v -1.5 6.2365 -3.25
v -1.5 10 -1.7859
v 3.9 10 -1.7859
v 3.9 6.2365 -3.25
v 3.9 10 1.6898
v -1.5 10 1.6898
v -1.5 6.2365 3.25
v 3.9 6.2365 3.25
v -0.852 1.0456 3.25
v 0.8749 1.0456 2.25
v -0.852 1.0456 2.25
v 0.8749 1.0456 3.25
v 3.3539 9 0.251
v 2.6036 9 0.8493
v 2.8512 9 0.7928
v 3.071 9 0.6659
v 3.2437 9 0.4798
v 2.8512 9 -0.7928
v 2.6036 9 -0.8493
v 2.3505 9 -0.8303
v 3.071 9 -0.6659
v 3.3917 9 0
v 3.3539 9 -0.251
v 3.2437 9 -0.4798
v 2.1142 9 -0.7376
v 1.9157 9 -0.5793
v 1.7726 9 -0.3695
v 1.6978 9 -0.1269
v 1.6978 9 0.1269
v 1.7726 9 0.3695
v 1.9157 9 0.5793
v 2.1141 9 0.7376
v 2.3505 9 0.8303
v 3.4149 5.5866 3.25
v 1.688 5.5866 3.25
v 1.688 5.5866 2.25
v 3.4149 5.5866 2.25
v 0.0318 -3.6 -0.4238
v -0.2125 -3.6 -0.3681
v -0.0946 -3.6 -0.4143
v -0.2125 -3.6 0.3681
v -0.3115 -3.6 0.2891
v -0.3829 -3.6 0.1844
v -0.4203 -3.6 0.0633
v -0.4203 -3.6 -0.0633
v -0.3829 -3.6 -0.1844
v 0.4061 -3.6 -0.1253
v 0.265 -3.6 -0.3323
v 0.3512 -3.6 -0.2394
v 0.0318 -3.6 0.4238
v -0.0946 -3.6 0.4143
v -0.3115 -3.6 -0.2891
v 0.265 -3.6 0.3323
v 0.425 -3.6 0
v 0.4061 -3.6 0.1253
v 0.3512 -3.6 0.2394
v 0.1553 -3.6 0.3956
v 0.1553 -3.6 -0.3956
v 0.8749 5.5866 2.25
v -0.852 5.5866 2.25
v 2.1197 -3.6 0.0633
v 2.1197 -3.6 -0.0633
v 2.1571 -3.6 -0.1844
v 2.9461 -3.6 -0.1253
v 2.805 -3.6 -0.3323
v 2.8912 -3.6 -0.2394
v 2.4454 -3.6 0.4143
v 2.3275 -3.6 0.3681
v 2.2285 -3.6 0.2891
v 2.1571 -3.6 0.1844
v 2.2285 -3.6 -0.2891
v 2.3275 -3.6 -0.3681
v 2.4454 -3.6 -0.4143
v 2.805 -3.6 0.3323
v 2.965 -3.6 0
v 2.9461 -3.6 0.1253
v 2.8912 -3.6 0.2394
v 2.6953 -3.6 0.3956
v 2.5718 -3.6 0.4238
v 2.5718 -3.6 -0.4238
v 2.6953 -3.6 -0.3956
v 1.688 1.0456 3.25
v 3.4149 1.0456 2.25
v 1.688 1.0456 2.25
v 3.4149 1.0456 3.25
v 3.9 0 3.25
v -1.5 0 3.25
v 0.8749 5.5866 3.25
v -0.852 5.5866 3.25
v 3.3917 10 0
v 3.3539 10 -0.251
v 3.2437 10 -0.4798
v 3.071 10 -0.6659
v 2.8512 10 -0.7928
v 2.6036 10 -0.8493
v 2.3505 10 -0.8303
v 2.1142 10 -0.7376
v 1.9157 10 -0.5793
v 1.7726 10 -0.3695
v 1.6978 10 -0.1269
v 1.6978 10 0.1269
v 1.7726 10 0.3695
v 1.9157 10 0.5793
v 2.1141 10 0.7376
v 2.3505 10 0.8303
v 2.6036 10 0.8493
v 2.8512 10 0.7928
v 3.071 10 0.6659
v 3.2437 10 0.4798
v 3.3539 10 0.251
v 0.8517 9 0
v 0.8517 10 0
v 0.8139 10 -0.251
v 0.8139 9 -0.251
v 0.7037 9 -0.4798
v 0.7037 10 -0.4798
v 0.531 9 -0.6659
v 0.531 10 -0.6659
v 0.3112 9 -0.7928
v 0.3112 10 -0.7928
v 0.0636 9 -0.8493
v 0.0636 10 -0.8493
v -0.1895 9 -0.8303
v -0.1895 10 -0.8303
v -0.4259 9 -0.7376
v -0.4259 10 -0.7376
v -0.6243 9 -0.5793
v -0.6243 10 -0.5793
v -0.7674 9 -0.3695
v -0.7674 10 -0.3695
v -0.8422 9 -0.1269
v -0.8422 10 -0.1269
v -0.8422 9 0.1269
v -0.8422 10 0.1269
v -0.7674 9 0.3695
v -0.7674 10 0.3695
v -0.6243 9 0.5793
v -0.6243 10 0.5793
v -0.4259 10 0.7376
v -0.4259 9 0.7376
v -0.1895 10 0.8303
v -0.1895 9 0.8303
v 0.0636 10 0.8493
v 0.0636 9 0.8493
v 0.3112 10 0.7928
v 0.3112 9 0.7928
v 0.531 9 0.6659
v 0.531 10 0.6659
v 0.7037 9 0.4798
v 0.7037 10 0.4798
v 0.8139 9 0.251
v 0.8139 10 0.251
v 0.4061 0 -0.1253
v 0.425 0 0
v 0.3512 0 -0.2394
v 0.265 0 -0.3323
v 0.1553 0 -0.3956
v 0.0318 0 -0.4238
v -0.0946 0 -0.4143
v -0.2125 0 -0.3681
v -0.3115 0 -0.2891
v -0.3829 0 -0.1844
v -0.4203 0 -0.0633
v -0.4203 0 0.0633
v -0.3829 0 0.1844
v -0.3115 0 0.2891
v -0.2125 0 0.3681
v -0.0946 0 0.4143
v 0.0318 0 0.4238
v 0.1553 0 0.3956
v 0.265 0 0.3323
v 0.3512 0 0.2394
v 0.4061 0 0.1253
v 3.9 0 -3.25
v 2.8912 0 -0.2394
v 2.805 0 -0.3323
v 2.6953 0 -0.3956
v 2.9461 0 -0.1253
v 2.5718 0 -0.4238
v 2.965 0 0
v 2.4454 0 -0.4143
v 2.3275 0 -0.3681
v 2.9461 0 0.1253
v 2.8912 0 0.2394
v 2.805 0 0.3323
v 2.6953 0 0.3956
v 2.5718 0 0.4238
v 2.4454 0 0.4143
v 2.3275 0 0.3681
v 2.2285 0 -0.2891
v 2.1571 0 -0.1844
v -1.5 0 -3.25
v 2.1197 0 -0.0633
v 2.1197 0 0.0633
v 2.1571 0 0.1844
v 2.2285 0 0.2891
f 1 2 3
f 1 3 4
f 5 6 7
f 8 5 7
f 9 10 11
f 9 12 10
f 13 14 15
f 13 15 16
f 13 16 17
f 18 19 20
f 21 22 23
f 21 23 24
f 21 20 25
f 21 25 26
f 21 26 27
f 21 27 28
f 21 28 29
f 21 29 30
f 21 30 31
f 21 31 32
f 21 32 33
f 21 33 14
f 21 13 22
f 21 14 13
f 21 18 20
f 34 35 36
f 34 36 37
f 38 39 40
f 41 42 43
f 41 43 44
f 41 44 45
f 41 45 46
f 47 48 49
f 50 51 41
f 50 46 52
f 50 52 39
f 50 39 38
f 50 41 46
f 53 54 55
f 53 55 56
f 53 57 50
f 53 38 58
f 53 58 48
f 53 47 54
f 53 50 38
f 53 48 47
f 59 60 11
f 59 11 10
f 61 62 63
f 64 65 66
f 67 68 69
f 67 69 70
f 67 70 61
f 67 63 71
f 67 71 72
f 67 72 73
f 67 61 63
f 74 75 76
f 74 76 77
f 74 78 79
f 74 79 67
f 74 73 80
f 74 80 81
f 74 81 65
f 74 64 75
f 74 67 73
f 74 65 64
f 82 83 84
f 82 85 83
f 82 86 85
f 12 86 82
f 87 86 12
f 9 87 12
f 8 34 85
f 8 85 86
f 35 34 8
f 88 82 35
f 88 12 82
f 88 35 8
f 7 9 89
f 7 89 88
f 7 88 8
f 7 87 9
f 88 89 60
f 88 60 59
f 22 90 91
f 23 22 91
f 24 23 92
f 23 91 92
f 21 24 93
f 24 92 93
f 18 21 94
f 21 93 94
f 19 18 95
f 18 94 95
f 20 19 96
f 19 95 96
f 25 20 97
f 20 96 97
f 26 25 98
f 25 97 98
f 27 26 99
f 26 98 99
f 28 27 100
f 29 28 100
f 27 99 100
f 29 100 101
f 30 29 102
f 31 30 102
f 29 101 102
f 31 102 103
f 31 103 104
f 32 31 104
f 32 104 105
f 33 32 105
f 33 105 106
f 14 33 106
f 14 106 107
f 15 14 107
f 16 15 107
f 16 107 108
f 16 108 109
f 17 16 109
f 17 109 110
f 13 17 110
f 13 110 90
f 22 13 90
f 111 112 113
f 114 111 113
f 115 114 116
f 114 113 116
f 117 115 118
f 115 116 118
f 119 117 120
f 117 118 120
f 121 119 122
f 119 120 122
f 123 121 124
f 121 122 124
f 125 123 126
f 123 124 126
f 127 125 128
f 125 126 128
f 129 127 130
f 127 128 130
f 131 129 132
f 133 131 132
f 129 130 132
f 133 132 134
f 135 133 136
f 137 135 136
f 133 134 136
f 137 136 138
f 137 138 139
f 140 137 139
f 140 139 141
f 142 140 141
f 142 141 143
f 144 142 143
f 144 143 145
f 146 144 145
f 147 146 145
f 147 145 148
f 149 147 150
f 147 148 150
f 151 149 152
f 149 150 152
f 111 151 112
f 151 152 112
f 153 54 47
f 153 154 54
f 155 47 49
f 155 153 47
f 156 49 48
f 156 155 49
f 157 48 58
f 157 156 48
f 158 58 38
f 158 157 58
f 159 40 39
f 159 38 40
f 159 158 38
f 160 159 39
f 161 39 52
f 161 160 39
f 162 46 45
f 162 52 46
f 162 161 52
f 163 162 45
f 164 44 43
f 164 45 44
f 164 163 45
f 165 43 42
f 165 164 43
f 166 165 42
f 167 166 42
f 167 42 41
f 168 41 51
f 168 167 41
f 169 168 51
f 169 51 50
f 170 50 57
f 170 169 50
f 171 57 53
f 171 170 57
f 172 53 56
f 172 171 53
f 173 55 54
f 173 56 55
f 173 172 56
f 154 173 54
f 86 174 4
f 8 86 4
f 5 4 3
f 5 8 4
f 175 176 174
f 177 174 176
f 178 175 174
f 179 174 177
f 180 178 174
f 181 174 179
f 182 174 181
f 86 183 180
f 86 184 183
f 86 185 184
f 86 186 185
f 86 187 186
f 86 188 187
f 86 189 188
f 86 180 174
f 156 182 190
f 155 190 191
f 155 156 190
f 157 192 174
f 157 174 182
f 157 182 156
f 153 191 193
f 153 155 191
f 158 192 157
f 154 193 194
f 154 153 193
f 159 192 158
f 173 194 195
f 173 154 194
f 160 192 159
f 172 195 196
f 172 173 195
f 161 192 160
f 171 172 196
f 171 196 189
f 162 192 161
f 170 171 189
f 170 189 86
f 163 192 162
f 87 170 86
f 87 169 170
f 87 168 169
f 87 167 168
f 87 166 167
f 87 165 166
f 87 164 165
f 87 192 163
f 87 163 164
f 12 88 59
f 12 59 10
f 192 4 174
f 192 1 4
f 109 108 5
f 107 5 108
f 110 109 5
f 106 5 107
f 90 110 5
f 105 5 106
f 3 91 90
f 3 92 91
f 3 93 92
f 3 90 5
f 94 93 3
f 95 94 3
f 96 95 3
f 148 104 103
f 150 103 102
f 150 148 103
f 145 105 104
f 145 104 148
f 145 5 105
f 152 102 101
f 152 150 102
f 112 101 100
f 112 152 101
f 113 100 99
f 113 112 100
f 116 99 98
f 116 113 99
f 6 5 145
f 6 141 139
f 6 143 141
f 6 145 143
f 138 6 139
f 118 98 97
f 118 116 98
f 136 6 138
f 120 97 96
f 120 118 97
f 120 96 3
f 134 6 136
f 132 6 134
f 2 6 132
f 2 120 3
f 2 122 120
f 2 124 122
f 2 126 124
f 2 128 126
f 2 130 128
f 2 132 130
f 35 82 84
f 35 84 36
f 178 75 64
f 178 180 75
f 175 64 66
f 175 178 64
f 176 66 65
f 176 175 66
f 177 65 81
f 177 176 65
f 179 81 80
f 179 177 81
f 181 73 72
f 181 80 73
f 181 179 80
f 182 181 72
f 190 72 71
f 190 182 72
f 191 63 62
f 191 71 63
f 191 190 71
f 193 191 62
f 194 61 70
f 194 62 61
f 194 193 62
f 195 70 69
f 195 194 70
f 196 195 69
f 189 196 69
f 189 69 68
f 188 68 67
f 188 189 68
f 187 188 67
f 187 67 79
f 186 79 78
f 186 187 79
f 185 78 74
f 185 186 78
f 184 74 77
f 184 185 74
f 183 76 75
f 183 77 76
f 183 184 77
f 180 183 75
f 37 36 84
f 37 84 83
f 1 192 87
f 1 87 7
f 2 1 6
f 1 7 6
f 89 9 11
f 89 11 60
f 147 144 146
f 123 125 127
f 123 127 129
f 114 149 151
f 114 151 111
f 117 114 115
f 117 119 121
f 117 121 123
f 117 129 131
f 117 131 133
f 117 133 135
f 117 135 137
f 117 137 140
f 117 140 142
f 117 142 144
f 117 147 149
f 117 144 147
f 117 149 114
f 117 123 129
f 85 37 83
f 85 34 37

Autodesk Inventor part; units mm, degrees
ref_plane "YZ Plane" through (0, 0, 0) normal (1, 0, 0) x (0, 1, 0)
ref_plane "XZ Plane" through (0, 0, 0) normal (0, 1, 0) x (-1, 0, 0)
ref_plane "XY Plane" through (0, 0, 0) normal (0, 0, 1) x (1, 0, 0)
sketch "Sketch1" plane through (0, 0, 0) normal (1, 0, 0) x (0, 1, 0)
  line L0 (0, 3.25) -> (10, 3.25)
  line L1 (10, 3.25) -> (10, -3.25)
  line L2 (10, -3.25) -> (0, -3.25)
  line L3 (0, -3.25) -> (0, 3.25)
  line L4 (10, 1.6898) -> (6.2365, 3.25)
  line L5 (10, -1.7859) -> (6.2365, -3.25)
  point P0 (0, 0)
  dimension "d0" = 10
  dimension "d1" = 6.5
  dimension "d2" = 3.25
  dimension "d3" = 0
extrude "Extrusion1" add sketch "Sketch1" along normal blind 3.9 and the other way blind 1.5 contours L0 L4 L1 L5 L2 L3
sketch "Sketch2" plane through (-1.5, 0, -3.25) normal (0, -1, 0) x (1, 0, 0)
  circle A0 centre (1.5, 3.25) radius 0.425
  line L0 (0, 0) -> (0, 6.5) projected
  dimension "d7" = 0.85
  dimension "d12" = 1.5
extrude "Extrusion2" add sketch "Sketch2" along normal blind 3.6
sketch "Sketch3" plane through (-1.5, 10, 1.6898) normal (0, 1, 0) x (1, 0, 0)
  circle A0 centre (1.5, 1.6898) radius 0.8517
extrude "Extrusion3" cut sketch "Sketch3" against normal blind 1
sketch "Sketch4" plane through (-1.5, 0, 3.25) normal (0, 0, 1) x (1, 0, 0)
  line L0 (0.648, 5.5866) -> (2.3749, 5.5866)
  line L1 (2.3749, 5.5866) -> (2.3749, 1.0456)
  line L2 (2.3749, 1.0456) -> (0.648, 1.0456)
  line L3 (0.648, 1.0456) -> (0.648, 5.5866)
  point P0 (1.5, 0)
extrude "Extrusion4" cut sketch "Sketch4" against normal blind 1
pattern_linear "Rectangular Pattern1" count 2 spacing 2.54 along (1, 0, 0) of "Extrusion4", "Extrusion3", "Extrusion2"
properties part number "Screw_Terminal_2Pos"
